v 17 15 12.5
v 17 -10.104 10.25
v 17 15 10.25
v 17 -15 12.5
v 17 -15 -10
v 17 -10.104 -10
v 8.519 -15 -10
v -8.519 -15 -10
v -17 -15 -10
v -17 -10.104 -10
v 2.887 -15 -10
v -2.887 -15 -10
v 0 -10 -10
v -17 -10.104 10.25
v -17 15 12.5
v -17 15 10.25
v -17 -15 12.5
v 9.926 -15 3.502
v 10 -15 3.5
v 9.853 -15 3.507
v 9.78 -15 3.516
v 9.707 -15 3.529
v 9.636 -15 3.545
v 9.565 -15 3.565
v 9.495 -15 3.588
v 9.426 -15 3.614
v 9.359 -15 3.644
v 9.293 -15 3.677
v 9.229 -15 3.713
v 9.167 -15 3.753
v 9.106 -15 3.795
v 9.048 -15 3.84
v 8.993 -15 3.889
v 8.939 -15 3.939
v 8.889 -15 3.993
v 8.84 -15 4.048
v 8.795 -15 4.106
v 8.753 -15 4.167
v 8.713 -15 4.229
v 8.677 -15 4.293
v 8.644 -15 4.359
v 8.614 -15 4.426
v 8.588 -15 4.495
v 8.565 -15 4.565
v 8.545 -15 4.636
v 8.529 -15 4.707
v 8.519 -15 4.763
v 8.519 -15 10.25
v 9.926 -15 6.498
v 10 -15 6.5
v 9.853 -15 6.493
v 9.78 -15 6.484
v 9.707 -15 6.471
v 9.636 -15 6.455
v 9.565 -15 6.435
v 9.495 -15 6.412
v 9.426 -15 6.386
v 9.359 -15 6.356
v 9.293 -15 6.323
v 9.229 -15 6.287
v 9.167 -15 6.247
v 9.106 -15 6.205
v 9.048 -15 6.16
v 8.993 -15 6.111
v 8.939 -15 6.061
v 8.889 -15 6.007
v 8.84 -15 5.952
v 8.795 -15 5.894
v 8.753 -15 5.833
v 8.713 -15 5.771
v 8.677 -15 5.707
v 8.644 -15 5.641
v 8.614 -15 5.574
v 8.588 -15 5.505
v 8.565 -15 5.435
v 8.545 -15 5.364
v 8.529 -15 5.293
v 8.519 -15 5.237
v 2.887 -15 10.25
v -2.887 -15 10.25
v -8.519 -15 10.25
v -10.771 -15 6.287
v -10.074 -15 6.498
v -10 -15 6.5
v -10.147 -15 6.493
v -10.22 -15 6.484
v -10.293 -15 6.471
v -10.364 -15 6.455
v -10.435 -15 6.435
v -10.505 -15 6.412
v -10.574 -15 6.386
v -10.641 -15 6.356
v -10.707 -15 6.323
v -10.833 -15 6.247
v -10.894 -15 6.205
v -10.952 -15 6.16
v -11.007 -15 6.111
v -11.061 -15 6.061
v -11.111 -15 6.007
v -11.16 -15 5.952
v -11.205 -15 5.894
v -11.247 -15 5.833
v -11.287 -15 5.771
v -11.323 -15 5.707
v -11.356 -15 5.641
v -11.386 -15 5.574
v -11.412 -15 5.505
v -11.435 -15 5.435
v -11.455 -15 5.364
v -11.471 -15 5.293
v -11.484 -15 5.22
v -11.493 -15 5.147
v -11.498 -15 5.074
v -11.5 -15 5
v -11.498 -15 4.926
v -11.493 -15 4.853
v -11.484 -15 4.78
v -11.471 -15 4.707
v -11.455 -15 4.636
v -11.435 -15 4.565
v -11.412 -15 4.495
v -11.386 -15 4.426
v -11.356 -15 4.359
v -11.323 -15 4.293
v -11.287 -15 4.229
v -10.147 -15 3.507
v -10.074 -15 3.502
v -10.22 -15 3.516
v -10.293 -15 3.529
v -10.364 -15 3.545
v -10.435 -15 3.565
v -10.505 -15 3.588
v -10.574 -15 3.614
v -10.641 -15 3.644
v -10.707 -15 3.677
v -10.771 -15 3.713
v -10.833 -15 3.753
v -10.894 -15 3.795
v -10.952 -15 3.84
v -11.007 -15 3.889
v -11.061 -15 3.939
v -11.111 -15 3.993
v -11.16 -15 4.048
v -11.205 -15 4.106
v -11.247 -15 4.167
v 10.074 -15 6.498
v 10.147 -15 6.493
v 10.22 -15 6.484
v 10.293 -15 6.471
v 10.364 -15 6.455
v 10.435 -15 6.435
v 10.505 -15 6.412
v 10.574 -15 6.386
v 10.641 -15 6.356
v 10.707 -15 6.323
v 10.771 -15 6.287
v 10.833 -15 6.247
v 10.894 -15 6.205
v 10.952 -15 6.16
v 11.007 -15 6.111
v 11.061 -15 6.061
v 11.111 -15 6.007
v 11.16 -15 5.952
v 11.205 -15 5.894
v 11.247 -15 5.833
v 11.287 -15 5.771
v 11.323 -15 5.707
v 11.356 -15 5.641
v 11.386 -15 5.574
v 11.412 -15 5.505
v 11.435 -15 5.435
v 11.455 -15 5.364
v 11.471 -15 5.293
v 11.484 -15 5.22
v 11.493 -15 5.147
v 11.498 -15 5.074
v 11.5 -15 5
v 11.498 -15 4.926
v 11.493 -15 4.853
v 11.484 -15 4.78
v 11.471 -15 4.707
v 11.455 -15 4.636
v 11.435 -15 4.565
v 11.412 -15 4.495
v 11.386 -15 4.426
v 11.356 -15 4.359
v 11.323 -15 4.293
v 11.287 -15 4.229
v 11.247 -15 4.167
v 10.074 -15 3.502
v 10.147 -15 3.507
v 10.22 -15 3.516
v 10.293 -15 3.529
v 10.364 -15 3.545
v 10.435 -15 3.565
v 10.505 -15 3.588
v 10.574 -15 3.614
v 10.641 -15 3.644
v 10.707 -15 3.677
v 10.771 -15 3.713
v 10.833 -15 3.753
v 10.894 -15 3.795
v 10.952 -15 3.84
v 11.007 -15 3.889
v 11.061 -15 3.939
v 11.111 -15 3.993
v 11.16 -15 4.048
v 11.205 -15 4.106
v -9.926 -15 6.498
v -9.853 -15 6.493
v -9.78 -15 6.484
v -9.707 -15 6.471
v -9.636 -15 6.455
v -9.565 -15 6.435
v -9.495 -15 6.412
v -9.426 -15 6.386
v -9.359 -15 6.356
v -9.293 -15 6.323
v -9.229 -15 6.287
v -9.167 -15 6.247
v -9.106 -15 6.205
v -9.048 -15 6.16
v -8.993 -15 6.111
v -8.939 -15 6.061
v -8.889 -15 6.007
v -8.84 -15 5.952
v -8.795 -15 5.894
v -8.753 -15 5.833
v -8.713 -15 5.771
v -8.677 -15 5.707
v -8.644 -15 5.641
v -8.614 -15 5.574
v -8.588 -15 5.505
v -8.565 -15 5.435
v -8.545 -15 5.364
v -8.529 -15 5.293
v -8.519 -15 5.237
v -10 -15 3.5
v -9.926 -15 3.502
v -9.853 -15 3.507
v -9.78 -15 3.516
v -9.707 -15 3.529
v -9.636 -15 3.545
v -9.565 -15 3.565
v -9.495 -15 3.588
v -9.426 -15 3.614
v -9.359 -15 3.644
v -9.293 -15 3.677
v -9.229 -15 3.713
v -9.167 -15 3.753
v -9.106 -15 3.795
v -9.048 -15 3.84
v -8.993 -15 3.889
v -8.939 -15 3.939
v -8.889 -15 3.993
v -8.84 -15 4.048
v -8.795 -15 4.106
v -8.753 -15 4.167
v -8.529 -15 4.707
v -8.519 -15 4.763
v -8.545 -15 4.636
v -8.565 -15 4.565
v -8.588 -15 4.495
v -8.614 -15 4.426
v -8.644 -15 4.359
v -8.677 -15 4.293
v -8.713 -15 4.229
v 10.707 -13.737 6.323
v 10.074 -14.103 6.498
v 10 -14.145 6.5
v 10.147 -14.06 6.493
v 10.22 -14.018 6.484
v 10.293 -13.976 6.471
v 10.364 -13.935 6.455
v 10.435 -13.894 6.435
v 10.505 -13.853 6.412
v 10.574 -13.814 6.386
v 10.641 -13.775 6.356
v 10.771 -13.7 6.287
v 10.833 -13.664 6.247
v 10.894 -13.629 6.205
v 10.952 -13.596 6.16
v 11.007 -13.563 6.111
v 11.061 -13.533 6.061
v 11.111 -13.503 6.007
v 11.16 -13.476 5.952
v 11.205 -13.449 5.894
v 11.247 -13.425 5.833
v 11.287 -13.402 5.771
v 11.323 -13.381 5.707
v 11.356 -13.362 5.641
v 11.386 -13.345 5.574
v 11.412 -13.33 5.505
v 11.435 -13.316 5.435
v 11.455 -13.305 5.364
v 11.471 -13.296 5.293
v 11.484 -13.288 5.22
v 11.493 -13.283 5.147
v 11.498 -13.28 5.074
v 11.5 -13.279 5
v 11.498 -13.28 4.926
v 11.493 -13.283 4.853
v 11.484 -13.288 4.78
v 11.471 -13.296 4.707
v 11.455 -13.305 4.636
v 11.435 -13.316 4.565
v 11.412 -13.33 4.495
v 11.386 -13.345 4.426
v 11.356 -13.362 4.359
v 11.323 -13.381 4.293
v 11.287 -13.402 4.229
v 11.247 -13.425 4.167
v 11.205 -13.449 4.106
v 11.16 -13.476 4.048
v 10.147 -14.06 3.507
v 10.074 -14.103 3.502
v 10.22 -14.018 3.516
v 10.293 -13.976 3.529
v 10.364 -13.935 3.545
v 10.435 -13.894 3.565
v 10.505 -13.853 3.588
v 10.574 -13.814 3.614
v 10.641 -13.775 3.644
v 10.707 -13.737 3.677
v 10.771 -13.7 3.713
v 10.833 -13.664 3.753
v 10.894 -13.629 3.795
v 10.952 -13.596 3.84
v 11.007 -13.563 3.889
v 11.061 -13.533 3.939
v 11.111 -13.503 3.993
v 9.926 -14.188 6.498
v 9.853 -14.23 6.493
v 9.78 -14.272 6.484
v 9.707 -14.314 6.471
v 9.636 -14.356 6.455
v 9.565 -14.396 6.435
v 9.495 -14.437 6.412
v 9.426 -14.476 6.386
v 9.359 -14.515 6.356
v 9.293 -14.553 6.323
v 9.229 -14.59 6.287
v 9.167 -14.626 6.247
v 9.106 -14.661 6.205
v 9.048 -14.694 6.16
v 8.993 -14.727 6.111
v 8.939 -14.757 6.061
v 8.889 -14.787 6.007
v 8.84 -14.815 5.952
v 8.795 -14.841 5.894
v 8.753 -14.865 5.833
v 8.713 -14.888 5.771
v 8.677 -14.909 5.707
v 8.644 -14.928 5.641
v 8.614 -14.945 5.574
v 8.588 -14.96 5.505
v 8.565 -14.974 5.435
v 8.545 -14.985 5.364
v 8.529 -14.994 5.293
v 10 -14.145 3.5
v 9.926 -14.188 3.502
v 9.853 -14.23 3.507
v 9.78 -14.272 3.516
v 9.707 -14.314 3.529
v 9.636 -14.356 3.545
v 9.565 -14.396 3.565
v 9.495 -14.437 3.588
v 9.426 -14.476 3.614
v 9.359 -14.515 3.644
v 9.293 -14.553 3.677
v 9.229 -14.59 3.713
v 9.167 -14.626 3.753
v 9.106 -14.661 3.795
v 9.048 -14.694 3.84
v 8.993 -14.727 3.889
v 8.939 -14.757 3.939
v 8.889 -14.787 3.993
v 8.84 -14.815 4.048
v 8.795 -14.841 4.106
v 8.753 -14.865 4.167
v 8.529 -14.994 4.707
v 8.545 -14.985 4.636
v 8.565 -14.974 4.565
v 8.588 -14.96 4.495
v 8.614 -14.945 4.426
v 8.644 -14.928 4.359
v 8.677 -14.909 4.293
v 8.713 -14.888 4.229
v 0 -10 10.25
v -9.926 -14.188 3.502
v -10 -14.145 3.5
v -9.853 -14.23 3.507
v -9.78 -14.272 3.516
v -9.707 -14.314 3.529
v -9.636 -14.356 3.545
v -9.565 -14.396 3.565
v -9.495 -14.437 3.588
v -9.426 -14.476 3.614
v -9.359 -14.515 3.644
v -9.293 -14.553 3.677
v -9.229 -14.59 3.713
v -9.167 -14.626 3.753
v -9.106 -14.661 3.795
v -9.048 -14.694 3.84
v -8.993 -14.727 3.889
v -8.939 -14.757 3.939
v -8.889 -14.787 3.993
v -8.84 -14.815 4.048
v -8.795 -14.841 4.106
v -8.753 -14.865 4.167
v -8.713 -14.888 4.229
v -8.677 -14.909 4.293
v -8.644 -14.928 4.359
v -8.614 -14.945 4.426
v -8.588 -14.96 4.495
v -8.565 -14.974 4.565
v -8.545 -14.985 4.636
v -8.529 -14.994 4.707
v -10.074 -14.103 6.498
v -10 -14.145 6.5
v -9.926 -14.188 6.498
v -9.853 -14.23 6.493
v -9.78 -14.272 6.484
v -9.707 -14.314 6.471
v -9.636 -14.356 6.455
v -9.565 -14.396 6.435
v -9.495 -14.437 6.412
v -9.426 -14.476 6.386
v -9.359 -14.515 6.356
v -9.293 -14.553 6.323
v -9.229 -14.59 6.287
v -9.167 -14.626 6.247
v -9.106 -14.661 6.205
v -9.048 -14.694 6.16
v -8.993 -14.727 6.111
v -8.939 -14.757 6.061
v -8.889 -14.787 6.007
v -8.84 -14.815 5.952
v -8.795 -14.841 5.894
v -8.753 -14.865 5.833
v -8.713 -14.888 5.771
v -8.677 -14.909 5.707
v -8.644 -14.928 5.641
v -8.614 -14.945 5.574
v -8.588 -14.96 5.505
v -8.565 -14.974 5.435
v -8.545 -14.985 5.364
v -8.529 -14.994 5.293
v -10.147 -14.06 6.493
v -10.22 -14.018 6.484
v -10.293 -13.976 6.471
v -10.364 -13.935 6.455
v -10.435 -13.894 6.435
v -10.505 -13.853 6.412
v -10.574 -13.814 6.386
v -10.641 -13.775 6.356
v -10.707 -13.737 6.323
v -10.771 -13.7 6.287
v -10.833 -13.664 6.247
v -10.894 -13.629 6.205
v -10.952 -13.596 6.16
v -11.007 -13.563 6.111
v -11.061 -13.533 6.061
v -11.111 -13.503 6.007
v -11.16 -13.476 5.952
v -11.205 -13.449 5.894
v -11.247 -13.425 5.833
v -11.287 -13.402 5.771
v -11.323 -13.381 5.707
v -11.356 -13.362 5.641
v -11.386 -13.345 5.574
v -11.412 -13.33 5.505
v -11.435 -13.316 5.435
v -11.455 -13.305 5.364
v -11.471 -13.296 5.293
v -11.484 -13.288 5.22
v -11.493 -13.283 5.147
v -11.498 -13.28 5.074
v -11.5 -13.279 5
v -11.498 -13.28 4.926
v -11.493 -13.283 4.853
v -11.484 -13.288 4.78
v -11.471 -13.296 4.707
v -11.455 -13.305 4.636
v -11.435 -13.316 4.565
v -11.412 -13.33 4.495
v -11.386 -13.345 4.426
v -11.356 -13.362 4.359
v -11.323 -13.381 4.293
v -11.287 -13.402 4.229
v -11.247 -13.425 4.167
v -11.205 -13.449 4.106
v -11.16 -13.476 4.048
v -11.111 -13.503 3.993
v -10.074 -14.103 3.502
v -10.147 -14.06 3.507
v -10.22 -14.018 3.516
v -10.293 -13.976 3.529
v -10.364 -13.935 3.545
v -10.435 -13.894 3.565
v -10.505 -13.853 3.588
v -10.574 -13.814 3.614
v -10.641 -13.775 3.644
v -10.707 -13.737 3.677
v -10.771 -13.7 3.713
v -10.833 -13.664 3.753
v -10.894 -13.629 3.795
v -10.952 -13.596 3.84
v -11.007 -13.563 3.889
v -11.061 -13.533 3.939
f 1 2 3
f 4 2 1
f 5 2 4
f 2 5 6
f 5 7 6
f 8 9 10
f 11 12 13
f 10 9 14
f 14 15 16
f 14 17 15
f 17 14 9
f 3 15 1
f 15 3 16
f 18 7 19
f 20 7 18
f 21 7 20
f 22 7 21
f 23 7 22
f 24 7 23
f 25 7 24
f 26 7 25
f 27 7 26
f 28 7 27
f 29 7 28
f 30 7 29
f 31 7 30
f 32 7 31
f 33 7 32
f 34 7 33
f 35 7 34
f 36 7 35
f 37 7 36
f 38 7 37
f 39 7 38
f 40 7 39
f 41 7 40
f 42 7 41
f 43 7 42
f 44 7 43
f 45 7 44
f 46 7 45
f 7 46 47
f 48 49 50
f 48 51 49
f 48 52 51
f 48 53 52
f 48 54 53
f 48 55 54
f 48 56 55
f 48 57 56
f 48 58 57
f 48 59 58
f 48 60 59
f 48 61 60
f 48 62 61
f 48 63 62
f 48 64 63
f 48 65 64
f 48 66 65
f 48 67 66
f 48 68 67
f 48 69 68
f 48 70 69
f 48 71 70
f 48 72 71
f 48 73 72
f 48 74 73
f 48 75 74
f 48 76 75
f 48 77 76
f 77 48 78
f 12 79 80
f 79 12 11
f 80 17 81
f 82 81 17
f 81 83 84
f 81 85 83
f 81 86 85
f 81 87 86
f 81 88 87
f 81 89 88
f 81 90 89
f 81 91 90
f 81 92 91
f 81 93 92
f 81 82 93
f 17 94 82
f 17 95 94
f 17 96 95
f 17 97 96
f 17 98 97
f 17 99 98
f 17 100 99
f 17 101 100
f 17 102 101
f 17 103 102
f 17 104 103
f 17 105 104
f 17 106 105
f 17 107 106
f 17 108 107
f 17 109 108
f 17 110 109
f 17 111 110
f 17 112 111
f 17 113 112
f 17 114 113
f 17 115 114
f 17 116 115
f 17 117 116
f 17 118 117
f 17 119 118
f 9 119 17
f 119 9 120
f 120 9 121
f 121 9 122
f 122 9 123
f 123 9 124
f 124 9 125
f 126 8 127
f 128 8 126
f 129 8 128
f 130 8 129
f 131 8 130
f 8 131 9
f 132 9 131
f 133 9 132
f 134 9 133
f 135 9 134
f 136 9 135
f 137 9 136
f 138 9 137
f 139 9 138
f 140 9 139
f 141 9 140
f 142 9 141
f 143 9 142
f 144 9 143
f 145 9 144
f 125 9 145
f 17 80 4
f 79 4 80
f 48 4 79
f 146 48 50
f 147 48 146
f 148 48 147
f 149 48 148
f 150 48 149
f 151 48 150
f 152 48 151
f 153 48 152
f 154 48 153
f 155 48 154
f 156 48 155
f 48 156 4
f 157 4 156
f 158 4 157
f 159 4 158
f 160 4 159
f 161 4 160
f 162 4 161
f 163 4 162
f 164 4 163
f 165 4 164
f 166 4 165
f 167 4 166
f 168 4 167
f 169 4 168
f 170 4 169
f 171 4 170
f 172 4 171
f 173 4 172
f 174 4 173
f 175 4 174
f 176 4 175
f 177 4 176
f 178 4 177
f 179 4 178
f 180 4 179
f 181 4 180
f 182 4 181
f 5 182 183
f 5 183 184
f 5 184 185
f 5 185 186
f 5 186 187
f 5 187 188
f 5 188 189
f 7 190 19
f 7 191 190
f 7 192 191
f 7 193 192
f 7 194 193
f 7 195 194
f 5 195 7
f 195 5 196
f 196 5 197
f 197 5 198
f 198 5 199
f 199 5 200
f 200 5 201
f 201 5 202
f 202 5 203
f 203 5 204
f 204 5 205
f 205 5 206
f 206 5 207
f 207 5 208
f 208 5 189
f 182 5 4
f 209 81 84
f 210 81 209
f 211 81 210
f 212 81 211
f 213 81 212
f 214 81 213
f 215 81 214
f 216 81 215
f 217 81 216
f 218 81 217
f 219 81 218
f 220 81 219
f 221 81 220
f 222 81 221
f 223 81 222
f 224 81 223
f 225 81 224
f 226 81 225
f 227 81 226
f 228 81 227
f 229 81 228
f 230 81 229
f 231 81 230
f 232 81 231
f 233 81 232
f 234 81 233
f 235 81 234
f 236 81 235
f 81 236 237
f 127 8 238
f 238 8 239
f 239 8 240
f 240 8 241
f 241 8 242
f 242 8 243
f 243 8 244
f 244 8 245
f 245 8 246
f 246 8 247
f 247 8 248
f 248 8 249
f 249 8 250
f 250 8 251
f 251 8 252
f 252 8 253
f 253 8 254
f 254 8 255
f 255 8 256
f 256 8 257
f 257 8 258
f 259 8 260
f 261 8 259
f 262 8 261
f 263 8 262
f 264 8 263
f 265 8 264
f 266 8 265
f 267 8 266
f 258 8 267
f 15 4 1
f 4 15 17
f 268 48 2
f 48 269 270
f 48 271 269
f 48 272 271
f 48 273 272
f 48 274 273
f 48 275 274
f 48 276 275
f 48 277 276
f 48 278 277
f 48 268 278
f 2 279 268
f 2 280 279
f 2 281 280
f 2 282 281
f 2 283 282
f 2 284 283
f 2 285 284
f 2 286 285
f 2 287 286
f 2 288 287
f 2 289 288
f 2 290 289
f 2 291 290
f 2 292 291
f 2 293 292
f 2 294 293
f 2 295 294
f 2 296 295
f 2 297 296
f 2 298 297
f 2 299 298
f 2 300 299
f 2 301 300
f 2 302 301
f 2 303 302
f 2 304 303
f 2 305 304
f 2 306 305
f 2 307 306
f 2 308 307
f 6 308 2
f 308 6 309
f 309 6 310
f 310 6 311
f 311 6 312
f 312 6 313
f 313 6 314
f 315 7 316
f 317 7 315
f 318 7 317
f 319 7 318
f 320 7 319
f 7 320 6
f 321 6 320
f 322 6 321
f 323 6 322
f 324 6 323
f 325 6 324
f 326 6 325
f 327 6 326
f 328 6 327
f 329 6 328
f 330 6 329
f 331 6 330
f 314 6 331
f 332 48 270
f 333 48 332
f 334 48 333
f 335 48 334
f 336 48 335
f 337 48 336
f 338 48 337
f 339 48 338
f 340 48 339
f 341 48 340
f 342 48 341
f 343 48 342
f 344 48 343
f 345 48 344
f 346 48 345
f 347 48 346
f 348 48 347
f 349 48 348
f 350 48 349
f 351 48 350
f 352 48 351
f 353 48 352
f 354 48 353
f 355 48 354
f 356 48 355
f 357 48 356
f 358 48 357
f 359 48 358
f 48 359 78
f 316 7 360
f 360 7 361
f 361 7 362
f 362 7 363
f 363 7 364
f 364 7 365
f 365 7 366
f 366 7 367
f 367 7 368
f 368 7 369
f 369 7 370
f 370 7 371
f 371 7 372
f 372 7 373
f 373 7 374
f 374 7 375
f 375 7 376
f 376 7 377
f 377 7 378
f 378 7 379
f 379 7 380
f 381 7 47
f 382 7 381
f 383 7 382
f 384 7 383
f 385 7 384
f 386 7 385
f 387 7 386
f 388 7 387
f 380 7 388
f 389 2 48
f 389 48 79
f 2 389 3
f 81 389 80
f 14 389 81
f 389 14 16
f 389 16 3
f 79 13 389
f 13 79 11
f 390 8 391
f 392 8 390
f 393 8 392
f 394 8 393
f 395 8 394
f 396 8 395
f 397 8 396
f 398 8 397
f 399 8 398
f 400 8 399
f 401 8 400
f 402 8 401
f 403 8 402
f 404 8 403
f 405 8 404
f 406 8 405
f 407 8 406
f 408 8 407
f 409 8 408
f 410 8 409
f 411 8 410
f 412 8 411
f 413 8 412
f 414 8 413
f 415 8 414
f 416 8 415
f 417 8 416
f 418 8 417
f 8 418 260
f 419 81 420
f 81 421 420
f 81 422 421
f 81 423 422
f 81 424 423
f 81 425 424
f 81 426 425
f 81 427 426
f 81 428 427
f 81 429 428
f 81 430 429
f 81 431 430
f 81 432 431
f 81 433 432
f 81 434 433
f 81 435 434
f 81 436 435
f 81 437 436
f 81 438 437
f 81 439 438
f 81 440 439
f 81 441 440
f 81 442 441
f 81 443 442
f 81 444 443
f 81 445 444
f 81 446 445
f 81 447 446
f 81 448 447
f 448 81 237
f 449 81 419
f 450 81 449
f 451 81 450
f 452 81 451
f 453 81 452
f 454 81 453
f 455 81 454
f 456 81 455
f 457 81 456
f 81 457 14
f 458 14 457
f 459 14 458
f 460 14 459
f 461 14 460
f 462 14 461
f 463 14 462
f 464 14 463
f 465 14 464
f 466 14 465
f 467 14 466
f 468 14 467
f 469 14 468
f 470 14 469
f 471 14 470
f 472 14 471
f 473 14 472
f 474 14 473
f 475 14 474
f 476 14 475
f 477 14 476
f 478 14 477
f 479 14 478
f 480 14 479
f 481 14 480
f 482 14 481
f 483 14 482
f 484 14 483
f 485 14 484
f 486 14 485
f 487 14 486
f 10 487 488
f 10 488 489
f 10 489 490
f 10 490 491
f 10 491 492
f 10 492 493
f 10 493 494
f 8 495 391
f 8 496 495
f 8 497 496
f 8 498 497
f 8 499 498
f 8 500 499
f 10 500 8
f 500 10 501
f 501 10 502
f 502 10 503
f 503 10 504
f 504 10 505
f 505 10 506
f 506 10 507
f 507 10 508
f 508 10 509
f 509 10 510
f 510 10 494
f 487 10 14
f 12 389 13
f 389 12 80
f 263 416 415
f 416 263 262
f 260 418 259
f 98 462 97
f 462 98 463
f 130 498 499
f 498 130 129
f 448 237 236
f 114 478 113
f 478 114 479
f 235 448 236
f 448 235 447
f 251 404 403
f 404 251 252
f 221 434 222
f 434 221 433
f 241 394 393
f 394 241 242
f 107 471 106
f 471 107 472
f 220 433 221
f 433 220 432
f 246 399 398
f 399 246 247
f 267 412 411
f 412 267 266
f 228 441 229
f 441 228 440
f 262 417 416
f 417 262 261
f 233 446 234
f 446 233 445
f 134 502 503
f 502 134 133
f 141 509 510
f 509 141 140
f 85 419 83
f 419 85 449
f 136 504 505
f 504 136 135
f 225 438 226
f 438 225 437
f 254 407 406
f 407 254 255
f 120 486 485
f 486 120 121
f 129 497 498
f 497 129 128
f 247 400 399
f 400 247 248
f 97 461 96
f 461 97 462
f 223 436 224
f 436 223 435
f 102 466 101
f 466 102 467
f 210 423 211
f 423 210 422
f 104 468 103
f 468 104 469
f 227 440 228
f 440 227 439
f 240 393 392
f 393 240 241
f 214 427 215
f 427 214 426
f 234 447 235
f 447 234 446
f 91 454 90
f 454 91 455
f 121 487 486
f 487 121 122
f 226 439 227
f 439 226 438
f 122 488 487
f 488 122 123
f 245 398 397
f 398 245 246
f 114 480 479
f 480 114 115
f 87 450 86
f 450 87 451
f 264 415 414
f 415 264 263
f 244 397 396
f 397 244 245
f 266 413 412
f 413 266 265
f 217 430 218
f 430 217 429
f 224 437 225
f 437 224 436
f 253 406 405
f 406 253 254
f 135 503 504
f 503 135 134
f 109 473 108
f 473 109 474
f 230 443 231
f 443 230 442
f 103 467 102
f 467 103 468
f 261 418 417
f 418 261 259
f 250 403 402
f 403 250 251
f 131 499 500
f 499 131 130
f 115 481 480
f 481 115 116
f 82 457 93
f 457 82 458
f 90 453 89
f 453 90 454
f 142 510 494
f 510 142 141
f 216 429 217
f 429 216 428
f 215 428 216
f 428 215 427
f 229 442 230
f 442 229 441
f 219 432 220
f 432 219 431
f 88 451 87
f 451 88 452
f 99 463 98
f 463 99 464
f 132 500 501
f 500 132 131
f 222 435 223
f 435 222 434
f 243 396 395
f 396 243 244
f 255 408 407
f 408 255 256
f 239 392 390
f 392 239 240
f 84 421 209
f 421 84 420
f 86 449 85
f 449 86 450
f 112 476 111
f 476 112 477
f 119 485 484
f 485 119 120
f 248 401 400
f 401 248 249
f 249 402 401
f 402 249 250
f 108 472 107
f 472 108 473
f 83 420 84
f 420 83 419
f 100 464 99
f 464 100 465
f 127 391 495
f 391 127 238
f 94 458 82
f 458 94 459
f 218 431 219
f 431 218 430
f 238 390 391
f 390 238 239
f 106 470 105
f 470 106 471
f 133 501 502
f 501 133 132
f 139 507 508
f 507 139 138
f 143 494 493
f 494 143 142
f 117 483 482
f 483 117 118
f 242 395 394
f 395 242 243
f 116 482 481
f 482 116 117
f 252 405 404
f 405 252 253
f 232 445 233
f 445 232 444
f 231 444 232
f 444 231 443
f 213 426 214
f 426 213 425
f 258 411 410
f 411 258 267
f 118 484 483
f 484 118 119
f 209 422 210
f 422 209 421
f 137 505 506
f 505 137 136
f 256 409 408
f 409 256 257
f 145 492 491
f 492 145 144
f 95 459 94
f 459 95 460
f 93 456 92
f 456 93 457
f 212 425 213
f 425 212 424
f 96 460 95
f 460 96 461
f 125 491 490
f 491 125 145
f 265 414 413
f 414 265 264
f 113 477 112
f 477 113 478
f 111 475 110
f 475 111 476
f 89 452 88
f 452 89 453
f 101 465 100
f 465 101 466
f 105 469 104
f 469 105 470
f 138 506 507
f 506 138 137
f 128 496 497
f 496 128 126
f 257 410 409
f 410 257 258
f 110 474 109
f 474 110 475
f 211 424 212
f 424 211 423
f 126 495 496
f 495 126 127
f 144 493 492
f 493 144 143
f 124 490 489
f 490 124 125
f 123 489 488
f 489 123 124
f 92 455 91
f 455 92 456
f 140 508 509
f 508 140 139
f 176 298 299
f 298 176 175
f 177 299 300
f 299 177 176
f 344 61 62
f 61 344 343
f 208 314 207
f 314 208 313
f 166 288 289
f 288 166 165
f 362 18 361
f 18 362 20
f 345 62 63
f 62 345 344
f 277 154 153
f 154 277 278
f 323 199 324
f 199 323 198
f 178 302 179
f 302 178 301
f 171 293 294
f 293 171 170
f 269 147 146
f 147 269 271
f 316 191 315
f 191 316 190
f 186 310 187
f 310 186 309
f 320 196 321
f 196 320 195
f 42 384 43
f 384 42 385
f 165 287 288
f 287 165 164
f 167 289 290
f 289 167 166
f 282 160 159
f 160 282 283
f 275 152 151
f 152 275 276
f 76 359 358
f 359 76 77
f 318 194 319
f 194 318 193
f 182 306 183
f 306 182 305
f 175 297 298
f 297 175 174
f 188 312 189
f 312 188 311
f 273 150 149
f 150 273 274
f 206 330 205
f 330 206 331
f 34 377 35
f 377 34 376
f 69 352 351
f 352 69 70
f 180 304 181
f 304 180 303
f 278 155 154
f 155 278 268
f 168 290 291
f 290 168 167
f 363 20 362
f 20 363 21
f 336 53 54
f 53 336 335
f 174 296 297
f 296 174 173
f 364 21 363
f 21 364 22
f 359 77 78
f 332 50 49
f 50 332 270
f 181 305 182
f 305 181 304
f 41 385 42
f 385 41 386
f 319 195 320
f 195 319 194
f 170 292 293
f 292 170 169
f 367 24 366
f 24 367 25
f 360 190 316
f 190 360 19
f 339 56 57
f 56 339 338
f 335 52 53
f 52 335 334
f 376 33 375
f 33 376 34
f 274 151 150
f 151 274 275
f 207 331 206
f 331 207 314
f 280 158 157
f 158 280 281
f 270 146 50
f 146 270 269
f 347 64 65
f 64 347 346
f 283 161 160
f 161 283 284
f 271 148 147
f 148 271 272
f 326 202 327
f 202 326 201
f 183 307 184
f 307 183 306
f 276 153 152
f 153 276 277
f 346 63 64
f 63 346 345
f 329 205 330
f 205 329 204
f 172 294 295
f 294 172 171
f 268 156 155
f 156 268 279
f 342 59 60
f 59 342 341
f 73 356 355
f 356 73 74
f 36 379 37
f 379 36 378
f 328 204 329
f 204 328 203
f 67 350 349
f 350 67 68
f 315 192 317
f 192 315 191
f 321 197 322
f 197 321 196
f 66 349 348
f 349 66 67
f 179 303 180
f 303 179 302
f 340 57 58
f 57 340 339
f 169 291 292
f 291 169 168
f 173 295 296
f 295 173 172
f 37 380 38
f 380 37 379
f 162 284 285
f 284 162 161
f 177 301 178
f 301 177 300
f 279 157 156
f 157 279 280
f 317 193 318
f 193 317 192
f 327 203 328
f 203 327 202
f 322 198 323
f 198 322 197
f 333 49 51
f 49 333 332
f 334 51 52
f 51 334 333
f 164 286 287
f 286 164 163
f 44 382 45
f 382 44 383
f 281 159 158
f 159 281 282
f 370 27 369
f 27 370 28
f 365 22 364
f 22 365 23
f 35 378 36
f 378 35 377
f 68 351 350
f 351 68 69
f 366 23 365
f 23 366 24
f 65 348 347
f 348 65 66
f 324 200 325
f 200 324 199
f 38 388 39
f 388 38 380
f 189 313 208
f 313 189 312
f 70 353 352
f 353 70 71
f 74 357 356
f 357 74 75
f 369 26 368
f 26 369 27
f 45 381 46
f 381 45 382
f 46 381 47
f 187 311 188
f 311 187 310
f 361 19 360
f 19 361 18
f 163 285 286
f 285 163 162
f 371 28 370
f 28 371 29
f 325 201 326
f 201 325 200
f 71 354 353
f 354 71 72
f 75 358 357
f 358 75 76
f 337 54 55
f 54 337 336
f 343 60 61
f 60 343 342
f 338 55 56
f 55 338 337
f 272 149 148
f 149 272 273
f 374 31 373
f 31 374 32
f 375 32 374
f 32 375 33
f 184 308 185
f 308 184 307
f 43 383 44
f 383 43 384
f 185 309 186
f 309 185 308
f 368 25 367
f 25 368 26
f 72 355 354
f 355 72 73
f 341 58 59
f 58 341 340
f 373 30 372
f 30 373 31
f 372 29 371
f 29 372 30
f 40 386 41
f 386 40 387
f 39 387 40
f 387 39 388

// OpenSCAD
$fn = 128;

// Linear bearing block for 6.0mm shaft
// Block size: 34.0mm x 30.0mm (X x Y). Thickness along Z is parameterized.

block_x = 34.0;   // X
block_y = 30.0;   // Y
block_z = 20.0;   // Z

shaft_d = 6.0;    // shaft bore diameter (along X)

mount_d = 3.0;    // mounting hole diameter (through Z)
mount_spacing_x = 20.0;
mount_spacing_y = 20.0;

clamp_slot_w = 2.0;     // slot width (Y direction)
clamp_screw_d = 3.0;    // clamp screw hole diameter (along Y)
clamp_screw_x = 20.0;   // spacing between clamp screws along X

// Make the shaft channel clearly visible and more "bearing-block-like"
seat_open_angle = 120;  // degrees removed from the top to create a visible open seat
seat_relief_d = 10.0;   // larger relief around the bore to resemble a bearing seat

eps = 0.25;

// Connectivity overlap (1-2mm) to guarantee attachment between any sub-solids
overlap = 1.5;

module bearing_block_solid() {
    // Single connected solid body (explicit union to avoid accidental splits)
    union() {
        // Main body
        cube([block_x, block_y, block_z], center=true);

        // Added "bearing block" feature: a small top cap/bridge that is physically attached.
        // This ensures the model remains one connected piece even with aggressive seat opening cuts.
        // It overlaps into the main body by `overlap`.
        cap_x = block_x;
        cap_y = block_y;
        cap_z = 4.0;

        // Place cap so it intersects the top of the main body by `overlap`
        translate([0, 0, block_z/2 + cap_z/2 - overlap])
            cube([cap_x, cap_y, cap_z], center=true);

        // Added side ribs (left/center/right) as connecting geometry.
        // These address the "three separate pieces" issue by guaranteeing continuous material
        // across X, and they overlap into the main body by `overlap`.
        rib_z = block_z;
        rib_y = 6.0;
        rib_x = 6.0;

        // Center rib
        translate([0, 0, 0])
            cube([rib_x, rib_y, rib_z], center=true);

        // Left rib (attached to main body with overlap)
        translate([-(block_x/2 - rib_x/2 + overlap), 0, 0])
            cube([rib_x, rib_y, rib_z], center=true);

        // Right rib (attached to main body with overlap)
        translate([(block_x/2 - rib_x/2 + overlap), 0, 0])
            cube([rib_x, rib_y, rib_z], center=true);
    }
}

module linear_bearing_block() {
    difference() {
        // Ensure everything is one connected solid before subtracting features
        bearing_block_solid();

        // Primary shaft bore (through X)
        rotate([0, 90, 0])
            cylinder(h = block_x + 2*eps, d = shaft_d, center=true);

        // Secondary relief seat (through X)
        rotate([0, 90, 0])
            cylinder(h = block_x + 2*eps, d = seat_relief_d, center=true);

        // Open-top seat cut (removes a wedge from the top so the channel is visible)
        // Keep as-is, but the added cap/bridge ensures the body remains connected.
        for (a = [-seat_open_angle/2, seat_open_angle/2]) {
            rotate([0, 0, a])
                translate([0, (block_y/2) - (seat_relief_d/2), 0])
                    cube([block_x + 2*eps, block_y, block_z + 2*eps], center=true);
        }

        // Mounting holes: 4 holes through Z
        for (x = [-mount_spacing_x/2, mount_spacing_x/2])
            for (y = [-mount_spacing_y/2, mount_spacing_y/2])
                translate([x, y, 0])
                    cylinder(h = block_z + 2*eps, d = mount_d, center=true);

        // Split clamp slot: from top face down to slightly past bore center
        slot_depth = (block_z/2) - (-shaft_d/2) + eps; // from top to just below bore center
        translate([0, 0, block_z/2 - slot_depth/2 + eps])
            cube([block_x + 2*eps, clamp_slot_w, slot_depth], center=true);

        // Clamp screw holes: along Y, placed in the upper half so they intersect the slot region
        screw_z = block_z/4;
        for (x = [-clamp_screw_x/2, clamp_screw_x/2])
            translate([x, 0, screw_z])
                rotate([90, 0, 0])
                    cylinder(h = block_y + 2*eps, d = clamp_screw_d, center=true);
    }
}

linear_bearing_block();
